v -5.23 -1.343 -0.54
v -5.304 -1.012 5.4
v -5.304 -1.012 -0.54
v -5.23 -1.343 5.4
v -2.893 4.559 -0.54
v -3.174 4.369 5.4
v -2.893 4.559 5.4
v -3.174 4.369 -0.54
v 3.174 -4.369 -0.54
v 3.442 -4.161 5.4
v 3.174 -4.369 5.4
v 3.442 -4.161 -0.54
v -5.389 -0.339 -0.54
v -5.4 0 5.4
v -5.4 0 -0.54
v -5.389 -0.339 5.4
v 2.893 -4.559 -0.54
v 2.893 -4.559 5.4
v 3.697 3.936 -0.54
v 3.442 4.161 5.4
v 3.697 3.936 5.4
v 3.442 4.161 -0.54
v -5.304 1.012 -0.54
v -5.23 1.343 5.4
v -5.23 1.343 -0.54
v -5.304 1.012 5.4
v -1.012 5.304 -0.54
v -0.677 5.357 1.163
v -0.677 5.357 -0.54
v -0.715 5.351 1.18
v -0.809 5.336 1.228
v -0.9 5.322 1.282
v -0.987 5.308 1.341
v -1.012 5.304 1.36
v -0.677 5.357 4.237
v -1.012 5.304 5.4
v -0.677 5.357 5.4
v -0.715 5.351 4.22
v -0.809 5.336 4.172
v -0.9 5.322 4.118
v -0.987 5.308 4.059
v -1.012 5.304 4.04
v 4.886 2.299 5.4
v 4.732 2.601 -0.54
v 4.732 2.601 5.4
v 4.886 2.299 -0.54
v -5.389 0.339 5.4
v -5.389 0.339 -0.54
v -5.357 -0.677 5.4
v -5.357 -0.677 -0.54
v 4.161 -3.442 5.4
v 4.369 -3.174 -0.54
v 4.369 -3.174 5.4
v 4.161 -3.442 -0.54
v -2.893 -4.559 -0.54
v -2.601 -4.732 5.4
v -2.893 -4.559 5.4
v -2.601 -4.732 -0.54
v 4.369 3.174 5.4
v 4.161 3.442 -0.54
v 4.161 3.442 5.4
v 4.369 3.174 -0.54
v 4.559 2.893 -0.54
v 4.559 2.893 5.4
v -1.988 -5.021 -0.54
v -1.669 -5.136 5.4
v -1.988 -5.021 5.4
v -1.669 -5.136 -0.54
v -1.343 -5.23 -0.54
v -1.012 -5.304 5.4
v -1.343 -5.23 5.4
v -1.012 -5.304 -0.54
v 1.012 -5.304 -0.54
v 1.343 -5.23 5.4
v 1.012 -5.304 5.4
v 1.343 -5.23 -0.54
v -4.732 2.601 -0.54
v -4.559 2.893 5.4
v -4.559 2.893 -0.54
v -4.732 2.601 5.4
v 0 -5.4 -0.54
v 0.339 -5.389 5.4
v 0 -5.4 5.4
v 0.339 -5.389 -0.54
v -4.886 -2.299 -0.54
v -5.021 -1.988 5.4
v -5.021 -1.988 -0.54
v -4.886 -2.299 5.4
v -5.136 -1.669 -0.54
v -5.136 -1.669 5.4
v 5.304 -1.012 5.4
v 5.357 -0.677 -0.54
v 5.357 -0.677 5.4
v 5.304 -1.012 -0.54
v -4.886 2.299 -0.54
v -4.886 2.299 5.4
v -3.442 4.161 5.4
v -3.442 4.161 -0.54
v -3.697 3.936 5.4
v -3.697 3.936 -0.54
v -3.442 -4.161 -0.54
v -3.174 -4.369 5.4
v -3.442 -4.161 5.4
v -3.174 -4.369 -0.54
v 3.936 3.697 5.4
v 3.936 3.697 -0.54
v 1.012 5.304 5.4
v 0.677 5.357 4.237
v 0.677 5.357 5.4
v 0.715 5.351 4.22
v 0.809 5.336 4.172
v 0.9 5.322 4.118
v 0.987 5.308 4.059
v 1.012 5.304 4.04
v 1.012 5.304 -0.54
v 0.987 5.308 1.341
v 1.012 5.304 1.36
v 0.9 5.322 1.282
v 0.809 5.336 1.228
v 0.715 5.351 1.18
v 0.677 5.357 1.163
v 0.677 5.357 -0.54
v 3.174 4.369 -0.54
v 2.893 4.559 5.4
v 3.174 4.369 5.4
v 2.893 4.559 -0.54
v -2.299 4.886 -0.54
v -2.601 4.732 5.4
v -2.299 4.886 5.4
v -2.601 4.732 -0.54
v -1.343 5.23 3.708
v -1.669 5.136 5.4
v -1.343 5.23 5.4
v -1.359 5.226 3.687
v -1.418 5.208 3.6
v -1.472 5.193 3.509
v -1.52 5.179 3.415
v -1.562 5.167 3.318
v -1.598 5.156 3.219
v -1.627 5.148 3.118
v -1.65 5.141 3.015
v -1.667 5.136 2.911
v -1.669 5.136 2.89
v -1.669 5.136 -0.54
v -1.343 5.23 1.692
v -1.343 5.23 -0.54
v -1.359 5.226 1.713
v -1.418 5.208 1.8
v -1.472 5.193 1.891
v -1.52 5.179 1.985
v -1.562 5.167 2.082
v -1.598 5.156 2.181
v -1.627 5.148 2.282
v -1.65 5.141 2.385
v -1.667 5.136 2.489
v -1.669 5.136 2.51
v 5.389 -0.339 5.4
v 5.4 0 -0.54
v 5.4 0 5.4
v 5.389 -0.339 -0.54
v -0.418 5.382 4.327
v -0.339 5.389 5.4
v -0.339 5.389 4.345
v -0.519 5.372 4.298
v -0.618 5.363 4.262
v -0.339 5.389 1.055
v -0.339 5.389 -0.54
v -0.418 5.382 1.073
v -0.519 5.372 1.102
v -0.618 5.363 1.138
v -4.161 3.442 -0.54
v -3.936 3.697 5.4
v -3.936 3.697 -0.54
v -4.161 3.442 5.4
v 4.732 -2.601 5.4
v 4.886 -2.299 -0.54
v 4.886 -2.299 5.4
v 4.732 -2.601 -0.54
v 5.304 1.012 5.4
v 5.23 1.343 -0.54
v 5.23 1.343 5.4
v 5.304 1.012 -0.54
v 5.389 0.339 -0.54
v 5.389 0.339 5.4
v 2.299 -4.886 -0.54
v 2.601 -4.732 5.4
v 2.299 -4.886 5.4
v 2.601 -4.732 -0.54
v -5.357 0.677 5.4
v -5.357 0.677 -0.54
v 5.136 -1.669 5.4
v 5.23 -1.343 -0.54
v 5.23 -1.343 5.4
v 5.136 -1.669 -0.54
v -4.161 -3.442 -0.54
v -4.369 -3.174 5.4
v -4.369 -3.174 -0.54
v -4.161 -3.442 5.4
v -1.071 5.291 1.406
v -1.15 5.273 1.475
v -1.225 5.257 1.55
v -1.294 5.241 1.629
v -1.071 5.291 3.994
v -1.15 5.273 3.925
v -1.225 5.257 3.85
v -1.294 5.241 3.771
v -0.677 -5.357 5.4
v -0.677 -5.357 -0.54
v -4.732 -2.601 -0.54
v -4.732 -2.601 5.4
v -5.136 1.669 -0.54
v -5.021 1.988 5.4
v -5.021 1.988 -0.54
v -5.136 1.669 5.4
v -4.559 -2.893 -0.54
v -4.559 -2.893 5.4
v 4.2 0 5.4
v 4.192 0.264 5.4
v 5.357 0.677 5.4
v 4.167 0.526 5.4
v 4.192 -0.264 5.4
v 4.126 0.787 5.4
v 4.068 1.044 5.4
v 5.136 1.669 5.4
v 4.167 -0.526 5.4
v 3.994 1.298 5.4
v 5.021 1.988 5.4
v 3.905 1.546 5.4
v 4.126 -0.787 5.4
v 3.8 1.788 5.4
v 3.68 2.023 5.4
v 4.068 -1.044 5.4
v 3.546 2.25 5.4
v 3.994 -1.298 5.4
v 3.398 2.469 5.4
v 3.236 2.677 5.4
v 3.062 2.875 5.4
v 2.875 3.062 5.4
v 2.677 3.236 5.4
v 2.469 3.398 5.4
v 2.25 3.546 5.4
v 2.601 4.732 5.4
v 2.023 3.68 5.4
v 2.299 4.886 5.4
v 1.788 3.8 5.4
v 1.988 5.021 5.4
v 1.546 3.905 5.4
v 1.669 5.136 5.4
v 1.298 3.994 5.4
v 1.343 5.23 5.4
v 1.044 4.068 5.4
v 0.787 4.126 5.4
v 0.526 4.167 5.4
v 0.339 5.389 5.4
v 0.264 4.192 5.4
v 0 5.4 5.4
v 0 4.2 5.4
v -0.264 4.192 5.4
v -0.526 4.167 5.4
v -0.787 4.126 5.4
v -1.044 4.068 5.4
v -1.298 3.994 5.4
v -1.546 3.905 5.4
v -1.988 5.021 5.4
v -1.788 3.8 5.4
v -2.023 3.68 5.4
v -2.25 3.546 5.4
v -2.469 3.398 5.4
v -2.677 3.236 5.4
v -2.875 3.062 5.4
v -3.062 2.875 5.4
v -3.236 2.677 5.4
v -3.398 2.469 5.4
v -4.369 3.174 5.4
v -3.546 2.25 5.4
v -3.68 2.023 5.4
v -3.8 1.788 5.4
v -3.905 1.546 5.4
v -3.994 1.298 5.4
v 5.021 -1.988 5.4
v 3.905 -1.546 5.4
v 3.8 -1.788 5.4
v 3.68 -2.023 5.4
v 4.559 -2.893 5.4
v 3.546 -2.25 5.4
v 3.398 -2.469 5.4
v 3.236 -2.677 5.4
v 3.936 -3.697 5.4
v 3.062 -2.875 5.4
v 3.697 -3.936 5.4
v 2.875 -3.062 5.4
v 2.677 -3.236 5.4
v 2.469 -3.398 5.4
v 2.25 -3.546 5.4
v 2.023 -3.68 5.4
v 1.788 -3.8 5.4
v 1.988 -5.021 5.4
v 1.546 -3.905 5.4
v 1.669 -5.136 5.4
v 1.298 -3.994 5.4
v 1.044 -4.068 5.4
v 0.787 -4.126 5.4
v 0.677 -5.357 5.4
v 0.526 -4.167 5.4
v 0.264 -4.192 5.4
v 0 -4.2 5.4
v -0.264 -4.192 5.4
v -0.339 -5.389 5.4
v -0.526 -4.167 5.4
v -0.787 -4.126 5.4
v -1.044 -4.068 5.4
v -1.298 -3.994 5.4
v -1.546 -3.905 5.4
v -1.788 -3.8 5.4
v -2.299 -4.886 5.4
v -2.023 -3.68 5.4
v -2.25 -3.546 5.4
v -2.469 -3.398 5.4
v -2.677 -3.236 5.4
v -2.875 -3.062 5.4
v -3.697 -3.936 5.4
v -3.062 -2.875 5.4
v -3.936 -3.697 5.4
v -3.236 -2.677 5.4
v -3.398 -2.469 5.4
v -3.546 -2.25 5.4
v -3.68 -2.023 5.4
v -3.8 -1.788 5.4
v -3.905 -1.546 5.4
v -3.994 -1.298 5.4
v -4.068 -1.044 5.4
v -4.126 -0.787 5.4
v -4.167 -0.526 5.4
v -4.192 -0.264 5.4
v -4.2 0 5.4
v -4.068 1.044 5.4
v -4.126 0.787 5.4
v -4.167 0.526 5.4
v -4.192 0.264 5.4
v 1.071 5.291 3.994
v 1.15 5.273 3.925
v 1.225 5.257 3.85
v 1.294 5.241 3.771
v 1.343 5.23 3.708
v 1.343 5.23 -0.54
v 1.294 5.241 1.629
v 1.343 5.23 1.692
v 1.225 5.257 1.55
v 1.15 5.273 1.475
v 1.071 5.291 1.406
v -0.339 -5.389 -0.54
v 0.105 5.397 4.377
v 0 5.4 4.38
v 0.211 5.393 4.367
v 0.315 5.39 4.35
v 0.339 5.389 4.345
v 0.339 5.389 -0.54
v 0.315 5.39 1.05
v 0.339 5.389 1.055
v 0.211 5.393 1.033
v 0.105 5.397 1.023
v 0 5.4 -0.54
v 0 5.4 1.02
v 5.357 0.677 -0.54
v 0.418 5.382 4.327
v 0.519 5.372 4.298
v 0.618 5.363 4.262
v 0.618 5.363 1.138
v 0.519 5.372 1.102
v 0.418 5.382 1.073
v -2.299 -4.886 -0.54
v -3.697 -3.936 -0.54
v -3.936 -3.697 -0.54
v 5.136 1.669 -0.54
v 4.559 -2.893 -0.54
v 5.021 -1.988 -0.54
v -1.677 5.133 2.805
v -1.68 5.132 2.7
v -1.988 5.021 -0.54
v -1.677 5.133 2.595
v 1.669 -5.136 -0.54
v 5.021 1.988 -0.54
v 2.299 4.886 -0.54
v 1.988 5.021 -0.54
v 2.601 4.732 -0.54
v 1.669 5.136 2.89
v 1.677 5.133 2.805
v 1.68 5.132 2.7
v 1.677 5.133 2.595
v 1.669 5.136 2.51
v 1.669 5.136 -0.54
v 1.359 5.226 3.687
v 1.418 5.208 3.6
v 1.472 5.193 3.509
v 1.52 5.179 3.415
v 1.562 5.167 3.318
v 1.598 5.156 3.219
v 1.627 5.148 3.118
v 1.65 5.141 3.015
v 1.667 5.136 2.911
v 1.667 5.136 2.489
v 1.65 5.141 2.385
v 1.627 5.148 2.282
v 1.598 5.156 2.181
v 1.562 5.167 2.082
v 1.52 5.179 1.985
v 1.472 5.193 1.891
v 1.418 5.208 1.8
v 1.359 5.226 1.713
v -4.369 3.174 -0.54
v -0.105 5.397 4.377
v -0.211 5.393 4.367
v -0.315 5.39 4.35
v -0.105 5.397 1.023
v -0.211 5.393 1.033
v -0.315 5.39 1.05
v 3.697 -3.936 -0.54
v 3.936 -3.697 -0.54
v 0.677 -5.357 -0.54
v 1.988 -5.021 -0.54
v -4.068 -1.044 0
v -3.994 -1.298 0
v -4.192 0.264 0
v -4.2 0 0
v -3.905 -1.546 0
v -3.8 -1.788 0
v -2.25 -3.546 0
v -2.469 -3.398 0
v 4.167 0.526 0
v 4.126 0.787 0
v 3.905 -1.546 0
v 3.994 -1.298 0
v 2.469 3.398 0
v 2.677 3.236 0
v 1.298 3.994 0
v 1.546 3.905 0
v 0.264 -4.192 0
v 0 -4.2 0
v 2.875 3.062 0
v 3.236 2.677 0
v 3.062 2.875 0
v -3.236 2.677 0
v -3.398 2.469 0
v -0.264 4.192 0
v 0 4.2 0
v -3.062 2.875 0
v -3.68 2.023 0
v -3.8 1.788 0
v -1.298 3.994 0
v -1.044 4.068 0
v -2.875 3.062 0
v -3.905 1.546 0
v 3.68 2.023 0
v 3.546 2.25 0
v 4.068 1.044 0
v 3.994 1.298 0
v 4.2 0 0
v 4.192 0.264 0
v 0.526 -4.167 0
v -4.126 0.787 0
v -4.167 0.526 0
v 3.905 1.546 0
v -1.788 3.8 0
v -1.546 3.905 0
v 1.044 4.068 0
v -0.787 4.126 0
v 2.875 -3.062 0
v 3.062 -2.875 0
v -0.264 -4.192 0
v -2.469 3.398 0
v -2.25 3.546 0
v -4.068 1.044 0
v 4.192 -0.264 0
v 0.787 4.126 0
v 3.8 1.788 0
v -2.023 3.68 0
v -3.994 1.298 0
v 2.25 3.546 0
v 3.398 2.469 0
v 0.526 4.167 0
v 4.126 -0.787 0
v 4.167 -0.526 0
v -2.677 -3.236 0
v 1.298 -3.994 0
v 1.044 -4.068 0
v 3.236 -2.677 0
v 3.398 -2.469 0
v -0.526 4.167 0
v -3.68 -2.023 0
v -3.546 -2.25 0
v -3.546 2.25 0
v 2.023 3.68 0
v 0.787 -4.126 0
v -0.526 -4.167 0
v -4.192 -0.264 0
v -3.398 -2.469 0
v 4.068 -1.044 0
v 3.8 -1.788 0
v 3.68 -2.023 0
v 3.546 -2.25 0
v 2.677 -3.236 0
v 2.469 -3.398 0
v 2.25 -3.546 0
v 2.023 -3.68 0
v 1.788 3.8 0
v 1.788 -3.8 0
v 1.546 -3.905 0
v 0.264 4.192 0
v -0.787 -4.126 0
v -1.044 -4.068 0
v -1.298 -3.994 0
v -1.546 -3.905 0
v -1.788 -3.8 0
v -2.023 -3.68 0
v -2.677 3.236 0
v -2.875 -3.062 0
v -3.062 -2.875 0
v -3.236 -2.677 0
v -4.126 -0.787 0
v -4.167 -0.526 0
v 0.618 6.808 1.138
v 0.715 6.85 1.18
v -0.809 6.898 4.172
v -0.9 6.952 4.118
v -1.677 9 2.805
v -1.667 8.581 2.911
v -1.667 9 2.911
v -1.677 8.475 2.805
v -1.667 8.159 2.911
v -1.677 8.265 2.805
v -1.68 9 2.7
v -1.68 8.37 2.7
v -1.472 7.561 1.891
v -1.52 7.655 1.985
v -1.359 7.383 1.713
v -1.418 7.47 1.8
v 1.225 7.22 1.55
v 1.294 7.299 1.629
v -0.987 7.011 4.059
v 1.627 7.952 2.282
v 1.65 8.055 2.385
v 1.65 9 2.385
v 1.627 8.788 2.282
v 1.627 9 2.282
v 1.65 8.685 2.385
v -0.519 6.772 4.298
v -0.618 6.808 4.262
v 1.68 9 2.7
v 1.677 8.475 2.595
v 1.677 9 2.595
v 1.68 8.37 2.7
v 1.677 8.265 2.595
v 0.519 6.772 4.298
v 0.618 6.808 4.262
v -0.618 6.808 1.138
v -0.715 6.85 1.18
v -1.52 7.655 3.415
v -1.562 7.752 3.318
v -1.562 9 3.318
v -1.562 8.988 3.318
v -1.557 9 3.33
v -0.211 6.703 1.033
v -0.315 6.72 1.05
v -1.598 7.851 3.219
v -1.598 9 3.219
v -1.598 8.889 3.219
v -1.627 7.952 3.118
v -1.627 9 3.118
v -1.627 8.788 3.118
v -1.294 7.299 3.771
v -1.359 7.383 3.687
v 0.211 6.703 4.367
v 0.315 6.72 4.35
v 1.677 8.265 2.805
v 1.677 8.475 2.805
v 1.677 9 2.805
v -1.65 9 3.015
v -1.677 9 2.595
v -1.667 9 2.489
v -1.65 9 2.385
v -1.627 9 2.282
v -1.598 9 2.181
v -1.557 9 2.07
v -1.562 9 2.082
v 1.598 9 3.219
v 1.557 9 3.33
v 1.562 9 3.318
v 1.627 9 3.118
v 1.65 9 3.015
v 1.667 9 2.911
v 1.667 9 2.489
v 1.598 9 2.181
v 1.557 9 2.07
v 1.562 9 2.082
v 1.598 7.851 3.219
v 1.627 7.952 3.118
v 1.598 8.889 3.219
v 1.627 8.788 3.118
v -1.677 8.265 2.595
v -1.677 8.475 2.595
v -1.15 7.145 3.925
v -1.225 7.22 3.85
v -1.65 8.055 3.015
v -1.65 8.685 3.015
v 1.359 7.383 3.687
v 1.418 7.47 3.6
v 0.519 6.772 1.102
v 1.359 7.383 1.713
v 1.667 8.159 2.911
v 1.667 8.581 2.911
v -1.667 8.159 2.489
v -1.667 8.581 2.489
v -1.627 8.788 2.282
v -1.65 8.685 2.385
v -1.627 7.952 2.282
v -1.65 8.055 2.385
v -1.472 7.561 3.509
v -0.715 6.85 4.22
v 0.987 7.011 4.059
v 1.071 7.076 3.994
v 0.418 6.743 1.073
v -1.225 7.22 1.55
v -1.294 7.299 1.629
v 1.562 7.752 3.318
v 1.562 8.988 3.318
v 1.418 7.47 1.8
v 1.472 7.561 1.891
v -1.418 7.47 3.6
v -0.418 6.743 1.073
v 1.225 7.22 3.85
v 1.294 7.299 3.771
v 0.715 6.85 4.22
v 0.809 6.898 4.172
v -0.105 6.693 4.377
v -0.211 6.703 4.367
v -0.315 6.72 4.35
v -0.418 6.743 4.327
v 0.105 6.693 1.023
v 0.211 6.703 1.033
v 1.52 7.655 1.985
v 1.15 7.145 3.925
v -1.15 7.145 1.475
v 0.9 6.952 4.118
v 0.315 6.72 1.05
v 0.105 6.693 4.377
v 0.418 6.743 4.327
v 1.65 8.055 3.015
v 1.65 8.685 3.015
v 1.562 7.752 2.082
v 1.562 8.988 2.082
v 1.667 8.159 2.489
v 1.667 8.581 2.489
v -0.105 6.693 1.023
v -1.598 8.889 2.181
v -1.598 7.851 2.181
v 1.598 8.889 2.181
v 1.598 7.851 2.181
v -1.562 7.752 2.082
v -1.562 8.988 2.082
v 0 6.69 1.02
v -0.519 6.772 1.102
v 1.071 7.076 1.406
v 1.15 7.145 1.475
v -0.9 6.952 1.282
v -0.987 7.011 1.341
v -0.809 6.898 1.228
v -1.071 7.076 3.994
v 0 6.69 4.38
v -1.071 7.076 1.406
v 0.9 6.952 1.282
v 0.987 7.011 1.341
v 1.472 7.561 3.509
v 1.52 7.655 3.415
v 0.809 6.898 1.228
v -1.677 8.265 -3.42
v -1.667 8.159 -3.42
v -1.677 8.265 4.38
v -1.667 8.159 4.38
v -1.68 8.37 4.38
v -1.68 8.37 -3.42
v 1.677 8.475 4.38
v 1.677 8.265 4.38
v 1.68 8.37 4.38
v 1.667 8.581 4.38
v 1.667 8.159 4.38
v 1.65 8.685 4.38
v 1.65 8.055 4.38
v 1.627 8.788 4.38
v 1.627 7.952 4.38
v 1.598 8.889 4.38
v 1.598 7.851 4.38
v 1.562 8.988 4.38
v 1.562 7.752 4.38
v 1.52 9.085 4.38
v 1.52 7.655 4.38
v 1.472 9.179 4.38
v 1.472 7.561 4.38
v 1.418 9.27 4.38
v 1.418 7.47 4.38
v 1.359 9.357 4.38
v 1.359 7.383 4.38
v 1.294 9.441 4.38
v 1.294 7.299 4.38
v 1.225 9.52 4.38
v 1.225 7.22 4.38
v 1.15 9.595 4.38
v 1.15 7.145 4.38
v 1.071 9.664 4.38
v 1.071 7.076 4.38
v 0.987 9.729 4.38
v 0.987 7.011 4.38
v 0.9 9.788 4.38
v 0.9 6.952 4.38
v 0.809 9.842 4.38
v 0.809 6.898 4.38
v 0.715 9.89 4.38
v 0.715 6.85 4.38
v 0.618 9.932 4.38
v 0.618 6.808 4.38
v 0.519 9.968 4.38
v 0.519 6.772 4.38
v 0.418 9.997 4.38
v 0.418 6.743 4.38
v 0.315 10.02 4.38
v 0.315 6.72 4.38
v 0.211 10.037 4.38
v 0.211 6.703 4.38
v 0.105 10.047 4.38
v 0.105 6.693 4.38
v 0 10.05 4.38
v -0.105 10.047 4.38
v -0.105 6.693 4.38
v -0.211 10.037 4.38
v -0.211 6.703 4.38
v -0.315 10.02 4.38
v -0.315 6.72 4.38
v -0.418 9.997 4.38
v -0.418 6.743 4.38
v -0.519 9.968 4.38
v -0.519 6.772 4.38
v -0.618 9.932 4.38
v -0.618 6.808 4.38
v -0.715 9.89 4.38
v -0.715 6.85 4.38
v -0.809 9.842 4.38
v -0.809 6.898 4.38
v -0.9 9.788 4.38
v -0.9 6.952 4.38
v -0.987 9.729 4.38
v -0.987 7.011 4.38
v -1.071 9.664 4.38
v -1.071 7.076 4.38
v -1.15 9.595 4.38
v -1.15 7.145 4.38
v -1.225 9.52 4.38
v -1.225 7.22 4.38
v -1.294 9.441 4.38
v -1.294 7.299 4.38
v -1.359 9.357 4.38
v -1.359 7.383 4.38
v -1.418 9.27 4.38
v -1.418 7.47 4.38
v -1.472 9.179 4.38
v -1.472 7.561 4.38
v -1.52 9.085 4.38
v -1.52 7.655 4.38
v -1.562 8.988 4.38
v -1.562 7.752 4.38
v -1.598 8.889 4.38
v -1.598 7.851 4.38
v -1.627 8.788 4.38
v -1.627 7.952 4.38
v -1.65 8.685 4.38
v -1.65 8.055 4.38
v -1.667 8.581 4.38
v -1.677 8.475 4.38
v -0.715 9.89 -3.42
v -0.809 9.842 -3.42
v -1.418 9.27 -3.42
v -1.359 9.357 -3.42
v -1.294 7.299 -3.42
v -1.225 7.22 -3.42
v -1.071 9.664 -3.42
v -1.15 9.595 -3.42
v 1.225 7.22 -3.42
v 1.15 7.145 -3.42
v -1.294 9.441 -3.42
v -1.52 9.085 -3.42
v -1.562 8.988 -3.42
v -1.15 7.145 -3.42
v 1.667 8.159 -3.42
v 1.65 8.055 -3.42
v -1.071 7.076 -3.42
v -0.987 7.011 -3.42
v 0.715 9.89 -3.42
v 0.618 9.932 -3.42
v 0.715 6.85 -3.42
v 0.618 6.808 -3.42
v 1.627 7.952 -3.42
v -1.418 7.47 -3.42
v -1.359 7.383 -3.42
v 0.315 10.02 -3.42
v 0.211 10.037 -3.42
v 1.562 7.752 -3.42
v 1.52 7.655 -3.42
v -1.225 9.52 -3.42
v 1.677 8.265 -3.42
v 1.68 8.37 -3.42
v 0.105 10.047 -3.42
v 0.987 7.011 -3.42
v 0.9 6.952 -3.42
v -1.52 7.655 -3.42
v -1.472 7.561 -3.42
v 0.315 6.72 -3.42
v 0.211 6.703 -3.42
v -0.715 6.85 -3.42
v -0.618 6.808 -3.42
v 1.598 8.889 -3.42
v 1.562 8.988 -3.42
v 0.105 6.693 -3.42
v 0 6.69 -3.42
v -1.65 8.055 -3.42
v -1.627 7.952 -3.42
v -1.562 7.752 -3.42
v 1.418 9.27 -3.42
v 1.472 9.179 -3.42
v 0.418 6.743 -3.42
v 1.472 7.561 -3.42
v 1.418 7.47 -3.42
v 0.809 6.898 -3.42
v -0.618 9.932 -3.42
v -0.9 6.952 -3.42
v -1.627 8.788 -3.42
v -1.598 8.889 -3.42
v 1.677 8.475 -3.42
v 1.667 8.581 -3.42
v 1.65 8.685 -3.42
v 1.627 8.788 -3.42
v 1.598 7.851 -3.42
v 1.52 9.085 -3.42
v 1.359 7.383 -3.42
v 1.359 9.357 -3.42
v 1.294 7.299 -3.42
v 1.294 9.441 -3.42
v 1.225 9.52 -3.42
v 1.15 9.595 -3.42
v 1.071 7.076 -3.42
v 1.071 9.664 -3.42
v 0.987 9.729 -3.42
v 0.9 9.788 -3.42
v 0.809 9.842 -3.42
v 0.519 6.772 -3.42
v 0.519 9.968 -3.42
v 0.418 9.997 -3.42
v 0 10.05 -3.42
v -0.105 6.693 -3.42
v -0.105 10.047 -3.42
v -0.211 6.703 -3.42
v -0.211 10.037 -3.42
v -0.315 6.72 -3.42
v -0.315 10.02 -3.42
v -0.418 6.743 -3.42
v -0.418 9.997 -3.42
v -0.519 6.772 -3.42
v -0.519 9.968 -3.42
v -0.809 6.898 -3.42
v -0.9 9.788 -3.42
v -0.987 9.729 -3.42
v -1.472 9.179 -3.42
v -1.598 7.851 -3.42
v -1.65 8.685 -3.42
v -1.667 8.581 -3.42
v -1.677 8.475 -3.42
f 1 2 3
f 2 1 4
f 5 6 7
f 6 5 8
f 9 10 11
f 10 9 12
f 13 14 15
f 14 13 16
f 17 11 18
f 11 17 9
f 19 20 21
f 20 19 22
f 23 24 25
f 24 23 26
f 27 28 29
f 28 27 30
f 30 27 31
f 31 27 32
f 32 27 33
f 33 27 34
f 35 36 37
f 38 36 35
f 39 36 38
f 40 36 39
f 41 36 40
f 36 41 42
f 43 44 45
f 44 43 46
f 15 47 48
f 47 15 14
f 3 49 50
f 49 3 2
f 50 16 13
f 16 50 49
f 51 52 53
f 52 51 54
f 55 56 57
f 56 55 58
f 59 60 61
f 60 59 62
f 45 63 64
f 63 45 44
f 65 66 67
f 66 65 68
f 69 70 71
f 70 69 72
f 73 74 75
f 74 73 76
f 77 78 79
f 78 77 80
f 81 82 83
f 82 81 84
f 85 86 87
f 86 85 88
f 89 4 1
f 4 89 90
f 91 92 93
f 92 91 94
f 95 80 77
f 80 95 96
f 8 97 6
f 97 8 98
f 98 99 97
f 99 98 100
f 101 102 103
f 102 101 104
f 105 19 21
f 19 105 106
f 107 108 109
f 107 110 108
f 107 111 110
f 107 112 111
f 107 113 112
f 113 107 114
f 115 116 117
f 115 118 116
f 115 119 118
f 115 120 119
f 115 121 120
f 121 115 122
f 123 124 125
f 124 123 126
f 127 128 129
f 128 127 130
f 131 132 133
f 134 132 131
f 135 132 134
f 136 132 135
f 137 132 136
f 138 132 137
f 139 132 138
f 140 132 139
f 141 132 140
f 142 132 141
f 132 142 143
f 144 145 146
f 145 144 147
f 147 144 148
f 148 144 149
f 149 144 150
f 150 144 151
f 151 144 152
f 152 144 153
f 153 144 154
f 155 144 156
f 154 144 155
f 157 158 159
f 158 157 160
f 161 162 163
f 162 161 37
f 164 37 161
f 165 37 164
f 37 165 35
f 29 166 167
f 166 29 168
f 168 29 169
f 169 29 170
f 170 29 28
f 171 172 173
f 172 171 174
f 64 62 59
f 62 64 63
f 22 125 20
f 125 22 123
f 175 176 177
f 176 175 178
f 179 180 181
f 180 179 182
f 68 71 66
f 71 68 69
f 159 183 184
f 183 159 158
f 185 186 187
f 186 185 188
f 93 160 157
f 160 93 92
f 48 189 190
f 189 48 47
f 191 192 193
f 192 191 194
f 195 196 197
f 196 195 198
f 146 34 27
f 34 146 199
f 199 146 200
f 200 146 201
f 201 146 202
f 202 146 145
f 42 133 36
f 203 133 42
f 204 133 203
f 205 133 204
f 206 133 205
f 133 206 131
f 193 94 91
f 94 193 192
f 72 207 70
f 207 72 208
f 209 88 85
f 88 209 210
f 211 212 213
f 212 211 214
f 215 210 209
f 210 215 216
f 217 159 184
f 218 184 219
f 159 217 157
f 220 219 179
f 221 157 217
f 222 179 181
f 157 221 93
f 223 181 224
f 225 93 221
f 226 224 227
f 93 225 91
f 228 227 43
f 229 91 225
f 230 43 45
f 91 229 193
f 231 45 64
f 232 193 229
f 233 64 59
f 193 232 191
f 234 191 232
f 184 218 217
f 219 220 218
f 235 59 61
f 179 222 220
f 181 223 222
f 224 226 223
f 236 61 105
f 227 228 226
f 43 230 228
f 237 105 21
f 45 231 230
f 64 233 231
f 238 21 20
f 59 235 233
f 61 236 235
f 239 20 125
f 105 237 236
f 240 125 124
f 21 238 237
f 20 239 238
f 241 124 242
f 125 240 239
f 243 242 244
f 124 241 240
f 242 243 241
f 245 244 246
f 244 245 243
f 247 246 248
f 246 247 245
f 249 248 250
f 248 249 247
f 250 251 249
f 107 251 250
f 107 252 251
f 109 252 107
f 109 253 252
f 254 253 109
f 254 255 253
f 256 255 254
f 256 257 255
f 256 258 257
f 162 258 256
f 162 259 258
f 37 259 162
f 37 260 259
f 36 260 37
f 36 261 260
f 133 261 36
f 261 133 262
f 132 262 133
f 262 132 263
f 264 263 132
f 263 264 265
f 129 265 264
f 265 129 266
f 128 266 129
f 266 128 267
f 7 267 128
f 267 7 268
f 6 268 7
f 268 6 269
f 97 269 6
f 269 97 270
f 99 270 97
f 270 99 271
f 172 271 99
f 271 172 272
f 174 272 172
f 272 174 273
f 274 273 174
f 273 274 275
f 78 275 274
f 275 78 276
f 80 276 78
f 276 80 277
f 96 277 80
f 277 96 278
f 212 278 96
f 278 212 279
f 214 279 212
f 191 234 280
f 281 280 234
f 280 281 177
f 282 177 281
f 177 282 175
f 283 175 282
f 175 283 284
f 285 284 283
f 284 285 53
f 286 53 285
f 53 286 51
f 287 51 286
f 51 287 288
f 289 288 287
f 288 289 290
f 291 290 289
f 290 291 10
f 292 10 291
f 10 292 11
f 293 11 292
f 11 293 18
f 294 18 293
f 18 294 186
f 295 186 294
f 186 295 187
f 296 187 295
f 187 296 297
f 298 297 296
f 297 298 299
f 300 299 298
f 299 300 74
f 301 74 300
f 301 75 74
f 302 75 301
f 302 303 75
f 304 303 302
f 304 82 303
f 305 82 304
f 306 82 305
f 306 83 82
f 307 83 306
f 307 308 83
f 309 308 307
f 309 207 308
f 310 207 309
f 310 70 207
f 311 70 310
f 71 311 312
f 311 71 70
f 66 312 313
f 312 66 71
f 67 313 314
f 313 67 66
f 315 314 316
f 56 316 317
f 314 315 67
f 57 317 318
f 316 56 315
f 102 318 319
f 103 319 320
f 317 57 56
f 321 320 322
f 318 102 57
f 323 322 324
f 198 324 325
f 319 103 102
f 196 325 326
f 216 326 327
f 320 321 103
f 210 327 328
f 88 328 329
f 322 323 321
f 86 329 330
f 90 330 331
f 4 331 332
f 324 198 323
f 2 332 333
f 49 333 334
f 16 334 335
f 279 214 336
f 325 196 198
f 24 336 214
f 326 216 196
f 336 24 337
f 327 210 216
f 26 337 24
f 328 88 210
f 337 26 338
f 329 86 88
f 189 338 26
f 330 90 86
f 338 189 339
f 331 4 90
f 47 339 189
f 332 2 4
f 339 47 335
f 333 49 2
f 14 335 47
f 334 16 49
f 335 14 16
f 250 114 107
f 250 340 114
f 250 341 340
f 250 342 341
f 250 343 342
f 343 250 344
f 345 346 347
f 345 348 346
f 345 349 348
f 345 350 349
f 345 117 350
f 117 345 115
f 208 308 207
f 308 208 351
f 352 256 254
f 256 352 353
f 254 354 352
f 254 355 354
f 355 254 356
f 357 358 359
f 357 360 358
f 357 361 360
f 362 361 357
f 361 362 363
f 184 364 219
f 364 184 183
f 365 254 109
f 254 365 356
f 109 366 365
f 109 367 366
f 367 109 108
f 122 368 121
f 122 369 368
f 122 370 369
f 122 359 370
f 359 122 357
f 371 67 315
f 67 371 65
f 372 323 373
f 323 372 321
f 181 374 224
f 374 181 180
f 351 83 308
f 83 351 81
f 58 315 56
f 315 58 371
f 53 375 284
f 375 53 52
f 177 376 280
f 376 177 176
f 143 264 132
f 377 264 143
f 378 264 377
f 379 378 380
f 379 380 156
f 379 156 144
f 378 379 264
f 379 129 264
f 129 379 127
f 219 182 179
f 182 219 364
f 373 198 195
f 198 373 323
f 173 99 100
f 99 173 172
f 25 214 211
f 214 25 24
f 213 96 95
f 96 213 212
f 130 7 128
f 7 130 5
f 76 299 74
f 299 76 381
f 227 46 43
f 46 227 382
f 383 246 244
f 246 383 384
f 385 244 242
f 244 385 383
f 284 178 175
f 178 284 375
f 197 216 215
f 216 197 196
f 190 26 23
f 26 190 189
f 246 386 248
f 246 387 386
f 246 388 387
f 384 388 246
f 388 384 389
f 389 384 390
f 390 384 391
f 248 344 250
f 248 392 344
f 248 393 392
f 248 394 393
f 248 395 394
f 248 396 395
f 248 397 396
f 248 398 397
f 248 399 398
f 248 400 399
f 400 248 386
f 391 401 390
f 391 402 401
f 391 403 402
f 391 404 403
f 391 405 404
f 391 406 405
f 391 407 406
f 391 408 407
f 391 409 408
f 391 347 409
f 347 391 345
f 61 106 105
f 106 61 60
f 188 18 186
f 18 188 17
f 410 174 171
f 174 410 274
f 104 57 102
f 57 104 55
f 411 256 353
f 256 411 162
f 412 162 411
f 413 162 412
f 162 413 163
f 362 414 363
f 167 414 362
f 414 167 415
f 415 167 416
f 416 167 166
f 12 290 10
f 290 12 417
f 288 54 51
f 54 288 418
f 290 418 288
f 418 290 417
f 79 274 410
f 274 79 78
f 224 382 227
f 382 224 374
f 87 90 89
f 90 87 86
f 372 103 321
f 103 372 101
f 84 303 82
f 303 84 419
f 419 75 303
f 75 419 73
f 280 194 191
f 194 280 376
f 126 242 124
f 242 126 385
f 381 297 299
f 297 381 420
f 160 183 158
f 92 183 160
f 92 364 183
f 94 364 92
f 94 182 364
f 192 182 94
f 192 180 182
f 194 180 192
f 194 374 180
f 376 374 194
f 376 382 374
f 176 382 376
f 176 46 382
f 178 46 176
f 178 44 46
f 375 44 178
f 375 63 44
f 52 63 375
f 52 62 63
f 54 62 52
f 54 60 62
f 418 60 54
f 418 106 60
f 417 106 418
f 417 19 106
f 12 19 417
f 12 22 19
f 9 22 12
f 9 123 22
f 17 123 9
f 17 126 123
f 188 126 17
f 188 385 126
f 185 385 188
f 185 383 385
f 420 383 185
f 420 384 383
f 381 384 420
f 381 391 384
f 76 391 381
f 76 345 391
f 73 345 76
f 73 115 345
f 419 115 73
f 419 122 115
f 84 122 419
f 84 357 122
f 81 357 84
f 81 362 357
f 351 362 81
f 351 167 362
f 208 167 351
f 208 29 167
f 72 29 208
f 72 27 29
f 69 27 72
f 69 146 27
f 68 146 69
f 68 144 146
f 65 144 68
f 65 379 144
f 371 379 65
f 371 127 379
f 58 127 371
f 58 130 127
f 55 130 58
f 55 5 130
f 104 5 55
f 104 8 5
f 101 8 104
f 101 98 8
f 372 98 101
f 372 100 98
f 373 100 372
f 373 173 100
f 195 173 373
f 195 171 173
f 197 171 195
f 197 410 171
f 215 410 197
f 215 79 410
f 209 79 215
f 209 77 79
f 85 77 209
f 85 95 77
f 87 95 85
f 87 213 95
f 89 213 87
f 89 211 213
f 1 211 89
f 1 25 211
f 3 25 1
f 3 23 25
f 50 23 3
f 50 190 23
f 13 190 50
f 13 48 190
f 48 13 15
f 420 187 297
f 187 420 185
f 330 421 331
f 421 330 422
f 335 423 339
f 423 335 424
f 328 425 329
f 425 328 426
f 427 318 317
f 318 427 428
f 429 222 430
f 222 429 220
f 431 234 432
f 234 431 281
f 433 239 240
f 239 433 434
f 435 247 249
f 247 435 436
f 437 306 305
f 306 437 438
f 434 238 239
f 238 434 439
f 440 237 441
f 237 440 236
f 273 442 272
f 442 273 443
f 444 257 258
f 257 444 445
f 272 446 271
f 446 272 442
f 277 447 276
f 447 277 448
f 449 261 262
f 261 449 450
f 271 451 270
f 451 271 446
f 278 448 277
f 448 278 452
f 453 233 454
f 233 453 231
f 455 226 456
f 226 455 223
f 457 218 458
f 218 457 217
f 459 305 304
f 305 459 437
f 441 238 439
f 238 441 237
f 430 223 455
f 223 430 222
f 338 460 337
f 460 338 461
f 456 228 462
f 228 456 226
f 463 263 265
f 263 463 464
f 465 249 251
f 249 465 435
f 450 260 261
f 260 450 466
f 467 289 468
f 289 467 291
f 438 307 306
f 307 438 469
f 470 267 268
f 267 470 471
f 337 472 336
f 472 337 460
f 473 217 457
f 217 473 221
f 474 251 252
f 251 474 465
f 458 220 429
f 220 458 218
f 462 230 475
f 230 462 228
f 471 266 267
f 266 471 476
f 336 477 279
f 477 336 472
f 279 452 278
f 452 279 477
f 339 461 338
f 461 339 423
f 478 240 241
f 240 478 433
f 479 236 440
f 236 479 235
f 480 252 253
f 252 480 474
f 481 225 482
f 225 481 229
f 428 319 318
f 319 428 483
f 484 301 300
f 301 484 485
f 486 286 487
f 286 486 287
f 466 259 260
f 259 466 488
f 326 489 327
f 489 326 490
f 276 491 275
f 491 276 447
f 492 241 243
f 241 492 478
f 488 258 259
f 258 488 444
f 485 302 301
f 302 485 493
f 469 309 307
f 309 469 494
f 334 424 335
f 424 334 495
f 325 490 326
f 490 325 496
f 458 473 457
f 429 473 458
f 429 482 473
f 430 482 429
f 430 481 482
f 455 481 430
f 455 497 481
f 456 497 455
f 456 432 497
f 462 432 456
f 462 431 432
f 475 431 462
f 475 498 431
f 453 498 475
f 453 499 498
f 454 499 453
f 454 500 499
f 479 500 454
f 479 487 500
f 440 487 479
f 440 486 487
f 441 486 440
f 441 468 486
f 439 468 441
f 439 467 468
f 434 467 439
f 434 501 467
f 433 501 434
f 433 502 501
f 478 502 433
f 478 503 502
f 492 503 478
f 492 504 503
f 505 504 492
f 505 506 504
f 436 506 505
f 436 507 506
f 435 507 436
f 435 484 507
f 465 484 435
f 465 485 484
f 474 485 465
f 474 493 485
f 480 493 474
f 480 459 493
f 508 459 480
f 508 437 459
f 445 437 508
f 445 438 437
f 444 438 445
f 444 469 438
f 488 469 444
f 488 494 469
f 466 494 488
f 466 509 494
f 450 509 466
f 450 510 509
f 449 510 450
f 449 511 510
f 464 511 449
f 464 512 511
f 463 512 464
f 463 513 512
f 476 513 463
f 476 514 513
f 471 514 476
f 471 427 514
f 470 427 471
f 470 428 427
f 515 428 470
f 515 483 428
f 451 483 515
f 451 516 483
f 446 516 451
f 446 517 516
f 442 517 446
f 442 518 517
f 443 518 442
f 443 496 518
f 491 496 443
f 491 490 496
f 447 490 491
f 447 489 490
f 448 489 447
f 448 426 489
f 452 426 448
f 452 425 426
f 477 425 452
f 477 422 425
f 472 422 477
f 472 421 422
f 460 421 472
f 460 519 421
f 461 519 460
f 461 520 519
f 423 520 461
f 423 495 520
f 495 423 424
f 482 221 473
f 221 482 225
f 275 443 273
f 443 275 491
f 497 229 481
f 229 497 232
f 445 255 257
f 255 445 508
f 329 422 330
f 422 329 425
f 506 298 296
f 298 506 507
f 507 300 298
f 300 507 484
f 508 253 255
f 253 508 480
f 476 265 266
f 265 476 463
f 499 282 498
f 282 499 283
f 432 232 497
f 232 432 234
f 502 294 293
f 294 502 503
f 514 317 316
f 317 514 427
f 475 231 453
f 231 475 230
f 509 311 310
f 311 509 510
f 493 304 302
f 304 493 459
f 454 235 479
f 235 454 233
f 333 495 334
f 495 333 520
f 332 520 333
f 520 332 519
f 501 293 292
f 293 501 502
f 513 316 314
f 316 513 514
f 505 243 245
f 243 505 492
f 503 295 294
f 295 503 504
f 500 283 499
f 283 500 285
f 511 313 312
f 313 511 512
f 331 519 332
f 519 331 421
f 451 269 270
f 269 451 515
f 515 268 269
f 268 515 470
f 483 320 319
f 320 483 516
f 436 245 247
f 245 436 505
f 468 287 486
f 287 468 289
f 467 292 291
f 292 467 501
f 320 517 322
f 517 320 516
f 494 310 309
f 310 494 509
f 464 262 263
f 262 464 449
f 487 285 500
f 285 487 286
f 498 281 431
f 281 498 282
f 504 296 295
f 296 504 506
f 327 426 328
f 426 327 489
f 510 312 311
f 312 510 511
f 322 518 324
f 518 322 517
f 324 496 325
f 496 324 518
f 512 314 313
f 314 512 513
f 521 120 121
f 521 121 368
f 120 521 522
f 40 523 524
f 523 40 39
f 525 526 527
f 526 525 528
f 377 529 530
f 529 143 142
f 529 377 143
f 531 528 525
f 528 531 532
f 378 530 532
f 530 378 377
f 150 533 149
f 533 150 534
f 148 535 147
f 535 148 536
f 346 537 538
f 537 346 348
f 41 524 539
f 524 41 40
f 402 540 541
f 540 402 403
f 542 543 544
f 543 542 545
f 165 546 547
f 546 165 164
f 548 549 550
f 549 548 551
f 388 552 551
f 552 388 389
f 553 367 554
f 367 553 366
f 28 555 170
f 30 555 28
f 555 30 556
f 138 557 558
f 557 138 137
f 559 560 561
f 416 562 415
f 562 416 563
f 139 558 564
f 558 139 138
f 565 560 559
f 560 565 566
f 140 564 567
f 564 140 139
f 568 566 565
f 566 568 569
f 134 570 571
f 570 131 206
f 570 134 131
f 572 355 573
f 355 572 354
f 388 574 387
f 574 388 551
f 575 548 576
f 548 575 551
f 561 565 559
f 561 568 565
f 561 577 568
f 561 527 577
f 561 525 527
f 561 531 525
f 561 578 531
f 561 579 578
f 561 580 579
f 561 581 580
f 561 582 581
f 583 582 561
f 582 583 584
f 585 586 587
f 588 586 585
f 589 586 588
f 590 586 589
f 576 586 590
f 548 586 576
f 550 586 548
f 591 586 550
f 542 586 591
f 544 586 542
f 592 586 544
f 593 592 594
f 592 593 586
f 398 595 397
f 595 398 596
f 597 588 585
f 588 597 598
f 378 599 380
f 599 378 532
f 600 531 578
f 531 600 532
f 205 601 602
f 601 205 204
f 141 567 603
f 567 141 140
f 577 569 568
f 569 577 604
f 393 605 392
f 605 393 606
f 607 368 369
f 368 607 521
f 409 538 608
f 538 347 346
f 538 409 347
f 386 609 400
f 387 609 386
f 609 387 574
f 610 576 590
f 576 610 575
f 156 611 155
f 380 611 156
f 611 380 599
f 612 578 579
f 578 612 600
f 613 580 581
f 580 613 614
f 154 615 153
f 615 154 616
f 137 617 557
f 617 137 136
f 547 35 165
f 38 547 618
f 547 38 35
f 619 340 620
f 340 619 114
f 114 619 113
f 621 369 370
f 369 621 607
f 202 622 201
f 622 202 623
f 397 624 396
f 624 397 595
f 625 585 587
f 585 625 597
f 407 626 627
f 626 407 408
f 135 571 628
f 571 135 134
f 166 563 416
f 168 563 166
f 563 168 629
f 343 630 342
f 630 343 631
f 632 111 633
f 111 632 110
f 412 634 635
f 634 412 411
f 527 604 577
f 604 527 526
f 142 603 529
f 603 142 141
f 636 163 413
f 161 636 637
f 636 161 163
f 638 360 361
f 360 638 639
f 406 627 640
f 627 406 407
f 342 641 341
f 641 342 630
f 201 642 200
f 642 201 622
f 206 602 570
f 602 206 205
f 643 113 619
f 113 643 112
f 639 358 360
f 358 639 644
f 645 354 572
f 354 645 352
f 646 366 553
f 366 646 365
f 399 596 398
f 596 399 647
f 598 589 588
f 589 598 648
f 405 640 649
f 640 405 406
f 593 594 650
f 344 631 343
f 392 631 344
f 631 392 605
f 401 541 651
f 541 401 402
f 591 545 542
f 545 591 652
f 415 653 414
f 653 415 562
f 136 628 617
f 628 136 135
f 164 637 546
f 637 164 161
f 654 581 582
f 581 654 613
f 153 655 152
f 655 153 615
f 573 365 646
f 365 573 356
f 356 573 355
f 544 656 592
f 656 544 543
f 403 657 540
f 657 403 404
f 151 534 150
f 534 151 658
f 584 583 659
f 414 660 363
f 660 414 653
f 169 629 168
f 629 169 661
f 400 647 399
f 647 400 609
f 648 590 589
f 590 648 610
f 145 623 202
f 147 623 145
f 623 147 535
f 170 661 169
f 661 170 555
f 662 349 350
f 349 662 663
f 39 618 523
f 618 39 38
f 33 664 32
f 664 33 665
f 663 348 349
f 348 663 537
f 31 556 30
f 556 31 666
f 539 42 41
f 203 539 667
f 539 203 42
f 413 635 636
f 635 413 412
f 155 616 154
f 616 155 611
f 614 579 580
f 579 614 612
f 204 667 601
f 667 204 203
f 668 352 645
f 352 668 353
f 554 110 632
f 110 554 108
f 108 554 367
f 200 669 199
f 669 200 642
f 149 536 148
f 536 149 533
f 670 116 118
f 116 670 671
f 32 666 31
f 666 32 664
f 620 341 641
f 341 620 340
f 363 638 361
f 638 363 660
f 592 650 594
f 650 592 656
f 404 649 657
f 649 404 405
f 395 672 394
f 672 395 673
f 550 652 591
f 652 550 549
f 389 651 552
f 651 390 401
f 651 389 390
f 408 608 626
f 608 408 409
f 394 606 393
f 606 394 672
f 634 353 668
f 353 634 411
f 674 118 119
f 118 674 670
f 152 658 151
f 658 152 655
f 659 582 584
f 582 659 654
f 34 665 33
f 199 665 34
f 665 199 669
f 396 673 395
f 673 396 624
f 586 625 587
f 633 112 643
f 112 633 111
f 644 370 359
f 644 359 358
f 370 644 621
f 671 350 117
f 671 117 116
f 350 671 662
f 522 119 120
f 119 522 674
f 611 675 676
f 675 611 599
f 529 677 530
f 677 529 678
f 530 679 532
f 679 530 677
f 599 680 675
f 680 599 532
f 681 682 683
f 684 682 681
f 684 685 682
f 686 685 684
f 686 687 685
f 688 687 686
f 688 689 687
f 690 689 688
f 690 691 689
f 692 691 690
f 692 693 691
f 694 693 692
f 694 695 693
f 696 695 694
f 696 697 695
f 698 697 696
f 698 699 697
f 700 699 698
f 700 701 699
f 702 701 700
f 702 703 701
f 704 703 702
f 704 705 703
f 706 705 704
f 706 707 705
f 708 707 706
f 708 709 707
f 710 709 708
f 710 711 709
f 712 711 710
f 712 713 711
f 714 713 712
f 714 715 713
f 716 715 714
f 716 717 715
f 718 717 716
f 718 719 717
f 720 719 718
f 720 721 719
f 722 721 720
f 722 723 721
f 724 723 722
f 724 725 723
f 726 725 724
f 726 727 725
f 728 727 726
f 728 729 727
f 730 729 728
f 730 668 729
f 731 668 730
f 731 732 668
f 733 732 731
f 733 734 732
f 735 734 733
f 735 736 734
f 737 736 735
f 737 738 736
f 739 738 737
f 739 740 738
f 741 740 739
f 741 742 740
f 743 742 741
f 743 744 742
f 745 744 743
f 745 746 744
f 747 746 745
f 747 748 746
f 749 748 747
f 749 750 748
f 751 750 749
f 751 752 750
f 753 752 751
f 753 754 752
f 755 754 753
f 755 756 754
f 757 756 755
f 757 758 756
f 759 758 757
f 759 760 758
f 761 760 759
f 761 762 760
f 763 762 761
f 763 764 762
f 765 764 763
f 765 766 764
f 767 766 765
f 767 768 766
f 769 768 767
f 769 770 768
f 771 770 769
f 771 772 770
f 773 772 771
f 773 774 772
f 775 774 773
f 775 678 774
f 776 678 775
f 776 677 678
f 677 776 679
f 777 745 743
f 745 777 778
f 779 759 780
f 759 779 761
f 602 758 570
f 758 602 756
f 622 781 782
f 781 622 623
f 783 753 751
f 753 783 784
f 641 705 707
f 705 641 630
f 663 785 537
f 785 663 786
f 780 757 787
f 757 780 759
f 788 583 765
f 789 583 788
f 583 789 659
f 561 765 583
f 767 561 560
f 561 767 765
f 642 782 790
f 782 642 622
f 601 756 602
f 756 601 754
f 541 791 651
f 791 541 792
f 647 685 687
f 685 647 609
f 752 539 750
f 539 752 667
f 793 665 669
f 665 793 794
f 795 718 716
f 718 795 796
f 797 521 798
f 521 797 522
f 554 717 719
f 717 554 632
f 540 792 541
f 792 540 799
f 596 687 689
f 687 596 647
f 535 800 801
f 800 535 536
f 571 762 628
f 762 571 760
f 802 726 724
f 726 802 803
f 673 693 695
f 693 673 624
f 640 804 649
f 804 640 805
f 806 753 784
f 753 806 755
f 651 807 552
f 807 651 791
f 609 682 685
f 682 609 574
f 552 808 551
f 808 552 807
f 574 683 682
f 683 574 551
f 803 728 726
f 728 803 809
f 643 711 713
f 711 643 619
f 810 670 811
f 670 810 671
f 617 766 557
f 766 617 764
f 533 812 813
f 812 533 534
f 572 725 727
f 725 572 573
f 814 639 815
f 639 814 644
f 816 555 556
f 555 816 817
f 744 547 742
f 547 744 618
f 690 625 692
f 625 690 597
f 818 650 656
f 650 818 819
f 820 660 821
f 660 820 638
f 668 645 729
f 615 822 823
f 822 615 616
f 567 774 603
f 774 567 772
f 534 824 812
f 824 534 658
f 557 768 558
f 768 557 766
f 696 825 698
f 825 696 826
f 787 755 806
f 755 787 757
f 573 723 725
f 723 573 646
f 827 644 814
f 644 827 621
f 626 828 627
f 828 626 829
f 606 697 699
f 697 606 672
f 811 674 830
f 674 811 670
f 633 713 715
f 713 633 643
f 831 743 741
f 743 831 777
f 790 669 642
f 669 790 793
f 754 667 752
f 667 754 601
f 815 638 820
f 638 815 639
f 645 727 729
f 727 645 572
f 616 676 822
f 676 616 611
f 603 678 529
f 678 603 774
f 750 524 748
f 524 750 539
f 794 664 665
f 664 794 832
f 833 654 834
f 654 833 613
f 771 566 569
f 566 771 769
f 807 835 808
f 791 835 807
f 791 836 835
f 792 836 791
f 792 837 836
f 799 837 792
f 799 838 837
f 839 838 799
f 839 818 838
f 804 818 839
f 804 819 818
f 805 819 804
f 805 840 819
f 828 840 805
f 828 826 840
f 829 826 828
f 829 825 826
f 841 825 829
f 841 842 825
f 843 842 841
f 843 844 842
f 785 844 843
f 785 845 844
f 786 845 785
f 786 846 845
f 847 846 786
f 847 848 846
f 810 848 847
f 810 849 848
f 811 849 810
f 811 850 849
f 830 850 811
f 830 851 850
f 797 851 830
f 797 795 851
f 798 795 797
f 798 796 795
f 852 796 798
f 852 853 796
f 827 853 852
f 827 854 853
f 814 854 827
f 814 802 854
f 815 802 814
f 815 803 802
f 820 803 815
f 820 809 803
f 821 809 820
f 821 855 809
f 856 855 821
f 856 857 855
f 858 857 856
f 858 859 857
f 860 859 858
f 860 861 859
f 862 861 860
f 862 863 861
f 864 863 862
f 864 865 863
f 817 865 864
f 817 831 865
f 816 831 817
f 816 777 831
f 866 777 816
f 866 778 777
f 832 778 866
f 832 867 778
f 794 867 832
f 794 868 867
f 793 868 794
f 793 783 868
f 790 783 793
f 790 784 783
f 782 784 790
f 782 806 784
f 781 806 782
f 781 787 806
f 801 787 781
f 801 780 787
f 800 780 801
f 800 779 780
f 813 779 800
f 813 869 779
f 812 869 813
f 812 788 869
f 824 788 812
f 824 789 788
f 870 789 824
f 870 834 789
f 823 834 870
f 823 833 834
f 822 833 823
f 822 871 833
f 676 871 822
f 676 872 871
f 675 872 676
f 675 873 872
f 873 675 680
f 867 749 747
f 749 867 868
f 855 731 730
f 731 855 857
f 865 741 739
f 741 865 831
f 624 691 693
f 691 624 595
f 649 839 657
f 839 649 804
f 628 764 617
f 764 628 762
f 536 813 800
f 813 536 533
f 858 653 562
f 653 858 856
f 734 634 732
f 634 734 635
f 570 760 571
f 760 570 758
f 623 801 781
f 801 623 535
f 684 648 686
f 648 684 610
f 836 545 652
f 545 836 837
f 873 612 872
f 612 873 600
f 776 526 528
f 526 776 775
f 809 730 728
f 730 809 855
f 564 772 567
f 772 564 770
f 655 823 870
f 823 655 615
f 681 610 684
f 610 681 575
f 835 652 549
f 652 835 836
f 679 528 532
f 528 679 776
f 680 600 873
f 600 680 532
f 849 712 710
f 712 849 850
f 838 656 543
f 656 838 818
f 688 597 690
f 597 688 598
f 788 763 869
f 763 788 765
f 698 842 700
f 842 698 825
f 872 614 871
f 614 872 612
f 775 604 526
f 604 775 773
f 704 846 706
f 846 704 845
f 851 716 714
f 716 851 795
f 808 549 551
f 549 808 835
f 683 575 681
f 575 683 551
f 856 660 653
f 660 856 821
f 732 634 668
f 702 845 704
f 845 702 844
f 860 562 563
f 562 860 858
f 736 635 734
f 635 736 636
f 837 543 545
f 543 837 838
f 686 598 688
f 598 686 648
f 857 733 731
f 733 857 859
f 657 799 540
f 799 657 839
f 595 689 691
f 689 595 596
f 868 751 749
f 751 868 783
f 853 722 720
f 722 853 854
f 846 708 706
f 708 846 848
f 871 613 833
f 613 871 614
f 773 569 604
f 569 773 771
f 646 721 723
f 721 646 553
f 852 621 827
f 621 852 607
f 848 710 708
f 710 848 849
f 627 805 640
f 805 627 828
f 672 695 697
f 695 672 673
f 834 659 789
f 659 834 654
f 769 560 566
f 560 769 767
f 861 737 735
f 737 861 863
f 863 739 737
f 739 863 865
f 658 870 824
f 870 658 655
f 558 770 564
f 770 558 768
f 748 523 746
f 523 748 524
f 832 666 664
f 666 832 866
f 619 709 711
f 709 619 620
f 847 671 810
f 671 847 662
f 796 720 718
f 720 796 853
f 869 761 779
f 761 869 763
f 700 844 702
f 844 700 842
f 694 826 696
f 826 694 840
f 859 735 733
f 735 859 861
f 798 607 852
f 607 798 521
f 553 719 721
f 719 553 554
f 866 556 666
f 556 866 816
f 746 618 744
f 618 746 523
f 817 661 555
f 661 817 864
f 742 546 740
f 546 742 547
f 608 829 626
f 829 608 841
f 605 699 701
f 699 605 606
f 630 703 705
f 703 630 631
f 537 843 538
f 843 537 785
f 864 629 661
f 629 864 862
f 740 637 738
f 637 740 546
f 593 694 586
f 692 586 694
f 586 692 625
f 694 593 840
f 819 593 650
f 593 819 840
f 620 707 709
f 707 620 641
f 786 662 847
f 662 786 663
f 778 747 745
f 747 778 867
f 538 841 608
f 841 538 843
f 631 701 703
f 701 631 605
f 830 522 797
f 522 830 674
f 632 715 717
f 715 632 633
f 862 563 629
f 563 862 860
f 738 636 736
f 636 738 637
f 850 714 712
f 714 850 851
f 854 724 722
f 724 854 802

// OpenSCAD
rotate([180,0,0])
scale(v= [-0.6,-0.6,-0.6]){
    BuildPiece(holeHeight=9, holeRadius=7, connectorRadius=9, horizontalLeggsLength=7, verticalLeggsLength=13);
}

module BuildPiece(holeHeight, holeRadius, connectorRadius, horizontalLeggsLength, verticalLeggsLength){
    Connector(holeRadius, holeHeight, connectorRadius);
    translate([0, horizontalLeggsLength+connectorRadius - ((connectorRadius-holeRadius)/2) , holeHeight/2])
    Leggs(horizontalLeggsLength, verticalLeggsLength, holeRadius/2.5);
}


module Leggs(verticalLength, horizontalLength, radius){
    union() {
        rotate([90,0,0])
        cylinder(r=radius, h=verticalLength, center=false, $fn=100);
        translate([0, verticalLength/4 -radius, radius])
        rotate([180,0,0])
        cylinder(r=radius, h=horizontalLength, center=false, $fn=100);
    }

}


module Connector(holeRadius=2, holeHeight=10, radius){
    rotate([180,0,0])
    difference(){

        translate([0,0,-holeHeight])
        linear_extrude(height = holeHeight + (holeHeight*0.1) , center = false)
        circle(r = radius, $fn=100);
        
        translate([0,0,-holeHeight])
        linear_extrude(height = holeHeight, center = false)
        circle(r = holeRadius, $fn=100);
    }
}
